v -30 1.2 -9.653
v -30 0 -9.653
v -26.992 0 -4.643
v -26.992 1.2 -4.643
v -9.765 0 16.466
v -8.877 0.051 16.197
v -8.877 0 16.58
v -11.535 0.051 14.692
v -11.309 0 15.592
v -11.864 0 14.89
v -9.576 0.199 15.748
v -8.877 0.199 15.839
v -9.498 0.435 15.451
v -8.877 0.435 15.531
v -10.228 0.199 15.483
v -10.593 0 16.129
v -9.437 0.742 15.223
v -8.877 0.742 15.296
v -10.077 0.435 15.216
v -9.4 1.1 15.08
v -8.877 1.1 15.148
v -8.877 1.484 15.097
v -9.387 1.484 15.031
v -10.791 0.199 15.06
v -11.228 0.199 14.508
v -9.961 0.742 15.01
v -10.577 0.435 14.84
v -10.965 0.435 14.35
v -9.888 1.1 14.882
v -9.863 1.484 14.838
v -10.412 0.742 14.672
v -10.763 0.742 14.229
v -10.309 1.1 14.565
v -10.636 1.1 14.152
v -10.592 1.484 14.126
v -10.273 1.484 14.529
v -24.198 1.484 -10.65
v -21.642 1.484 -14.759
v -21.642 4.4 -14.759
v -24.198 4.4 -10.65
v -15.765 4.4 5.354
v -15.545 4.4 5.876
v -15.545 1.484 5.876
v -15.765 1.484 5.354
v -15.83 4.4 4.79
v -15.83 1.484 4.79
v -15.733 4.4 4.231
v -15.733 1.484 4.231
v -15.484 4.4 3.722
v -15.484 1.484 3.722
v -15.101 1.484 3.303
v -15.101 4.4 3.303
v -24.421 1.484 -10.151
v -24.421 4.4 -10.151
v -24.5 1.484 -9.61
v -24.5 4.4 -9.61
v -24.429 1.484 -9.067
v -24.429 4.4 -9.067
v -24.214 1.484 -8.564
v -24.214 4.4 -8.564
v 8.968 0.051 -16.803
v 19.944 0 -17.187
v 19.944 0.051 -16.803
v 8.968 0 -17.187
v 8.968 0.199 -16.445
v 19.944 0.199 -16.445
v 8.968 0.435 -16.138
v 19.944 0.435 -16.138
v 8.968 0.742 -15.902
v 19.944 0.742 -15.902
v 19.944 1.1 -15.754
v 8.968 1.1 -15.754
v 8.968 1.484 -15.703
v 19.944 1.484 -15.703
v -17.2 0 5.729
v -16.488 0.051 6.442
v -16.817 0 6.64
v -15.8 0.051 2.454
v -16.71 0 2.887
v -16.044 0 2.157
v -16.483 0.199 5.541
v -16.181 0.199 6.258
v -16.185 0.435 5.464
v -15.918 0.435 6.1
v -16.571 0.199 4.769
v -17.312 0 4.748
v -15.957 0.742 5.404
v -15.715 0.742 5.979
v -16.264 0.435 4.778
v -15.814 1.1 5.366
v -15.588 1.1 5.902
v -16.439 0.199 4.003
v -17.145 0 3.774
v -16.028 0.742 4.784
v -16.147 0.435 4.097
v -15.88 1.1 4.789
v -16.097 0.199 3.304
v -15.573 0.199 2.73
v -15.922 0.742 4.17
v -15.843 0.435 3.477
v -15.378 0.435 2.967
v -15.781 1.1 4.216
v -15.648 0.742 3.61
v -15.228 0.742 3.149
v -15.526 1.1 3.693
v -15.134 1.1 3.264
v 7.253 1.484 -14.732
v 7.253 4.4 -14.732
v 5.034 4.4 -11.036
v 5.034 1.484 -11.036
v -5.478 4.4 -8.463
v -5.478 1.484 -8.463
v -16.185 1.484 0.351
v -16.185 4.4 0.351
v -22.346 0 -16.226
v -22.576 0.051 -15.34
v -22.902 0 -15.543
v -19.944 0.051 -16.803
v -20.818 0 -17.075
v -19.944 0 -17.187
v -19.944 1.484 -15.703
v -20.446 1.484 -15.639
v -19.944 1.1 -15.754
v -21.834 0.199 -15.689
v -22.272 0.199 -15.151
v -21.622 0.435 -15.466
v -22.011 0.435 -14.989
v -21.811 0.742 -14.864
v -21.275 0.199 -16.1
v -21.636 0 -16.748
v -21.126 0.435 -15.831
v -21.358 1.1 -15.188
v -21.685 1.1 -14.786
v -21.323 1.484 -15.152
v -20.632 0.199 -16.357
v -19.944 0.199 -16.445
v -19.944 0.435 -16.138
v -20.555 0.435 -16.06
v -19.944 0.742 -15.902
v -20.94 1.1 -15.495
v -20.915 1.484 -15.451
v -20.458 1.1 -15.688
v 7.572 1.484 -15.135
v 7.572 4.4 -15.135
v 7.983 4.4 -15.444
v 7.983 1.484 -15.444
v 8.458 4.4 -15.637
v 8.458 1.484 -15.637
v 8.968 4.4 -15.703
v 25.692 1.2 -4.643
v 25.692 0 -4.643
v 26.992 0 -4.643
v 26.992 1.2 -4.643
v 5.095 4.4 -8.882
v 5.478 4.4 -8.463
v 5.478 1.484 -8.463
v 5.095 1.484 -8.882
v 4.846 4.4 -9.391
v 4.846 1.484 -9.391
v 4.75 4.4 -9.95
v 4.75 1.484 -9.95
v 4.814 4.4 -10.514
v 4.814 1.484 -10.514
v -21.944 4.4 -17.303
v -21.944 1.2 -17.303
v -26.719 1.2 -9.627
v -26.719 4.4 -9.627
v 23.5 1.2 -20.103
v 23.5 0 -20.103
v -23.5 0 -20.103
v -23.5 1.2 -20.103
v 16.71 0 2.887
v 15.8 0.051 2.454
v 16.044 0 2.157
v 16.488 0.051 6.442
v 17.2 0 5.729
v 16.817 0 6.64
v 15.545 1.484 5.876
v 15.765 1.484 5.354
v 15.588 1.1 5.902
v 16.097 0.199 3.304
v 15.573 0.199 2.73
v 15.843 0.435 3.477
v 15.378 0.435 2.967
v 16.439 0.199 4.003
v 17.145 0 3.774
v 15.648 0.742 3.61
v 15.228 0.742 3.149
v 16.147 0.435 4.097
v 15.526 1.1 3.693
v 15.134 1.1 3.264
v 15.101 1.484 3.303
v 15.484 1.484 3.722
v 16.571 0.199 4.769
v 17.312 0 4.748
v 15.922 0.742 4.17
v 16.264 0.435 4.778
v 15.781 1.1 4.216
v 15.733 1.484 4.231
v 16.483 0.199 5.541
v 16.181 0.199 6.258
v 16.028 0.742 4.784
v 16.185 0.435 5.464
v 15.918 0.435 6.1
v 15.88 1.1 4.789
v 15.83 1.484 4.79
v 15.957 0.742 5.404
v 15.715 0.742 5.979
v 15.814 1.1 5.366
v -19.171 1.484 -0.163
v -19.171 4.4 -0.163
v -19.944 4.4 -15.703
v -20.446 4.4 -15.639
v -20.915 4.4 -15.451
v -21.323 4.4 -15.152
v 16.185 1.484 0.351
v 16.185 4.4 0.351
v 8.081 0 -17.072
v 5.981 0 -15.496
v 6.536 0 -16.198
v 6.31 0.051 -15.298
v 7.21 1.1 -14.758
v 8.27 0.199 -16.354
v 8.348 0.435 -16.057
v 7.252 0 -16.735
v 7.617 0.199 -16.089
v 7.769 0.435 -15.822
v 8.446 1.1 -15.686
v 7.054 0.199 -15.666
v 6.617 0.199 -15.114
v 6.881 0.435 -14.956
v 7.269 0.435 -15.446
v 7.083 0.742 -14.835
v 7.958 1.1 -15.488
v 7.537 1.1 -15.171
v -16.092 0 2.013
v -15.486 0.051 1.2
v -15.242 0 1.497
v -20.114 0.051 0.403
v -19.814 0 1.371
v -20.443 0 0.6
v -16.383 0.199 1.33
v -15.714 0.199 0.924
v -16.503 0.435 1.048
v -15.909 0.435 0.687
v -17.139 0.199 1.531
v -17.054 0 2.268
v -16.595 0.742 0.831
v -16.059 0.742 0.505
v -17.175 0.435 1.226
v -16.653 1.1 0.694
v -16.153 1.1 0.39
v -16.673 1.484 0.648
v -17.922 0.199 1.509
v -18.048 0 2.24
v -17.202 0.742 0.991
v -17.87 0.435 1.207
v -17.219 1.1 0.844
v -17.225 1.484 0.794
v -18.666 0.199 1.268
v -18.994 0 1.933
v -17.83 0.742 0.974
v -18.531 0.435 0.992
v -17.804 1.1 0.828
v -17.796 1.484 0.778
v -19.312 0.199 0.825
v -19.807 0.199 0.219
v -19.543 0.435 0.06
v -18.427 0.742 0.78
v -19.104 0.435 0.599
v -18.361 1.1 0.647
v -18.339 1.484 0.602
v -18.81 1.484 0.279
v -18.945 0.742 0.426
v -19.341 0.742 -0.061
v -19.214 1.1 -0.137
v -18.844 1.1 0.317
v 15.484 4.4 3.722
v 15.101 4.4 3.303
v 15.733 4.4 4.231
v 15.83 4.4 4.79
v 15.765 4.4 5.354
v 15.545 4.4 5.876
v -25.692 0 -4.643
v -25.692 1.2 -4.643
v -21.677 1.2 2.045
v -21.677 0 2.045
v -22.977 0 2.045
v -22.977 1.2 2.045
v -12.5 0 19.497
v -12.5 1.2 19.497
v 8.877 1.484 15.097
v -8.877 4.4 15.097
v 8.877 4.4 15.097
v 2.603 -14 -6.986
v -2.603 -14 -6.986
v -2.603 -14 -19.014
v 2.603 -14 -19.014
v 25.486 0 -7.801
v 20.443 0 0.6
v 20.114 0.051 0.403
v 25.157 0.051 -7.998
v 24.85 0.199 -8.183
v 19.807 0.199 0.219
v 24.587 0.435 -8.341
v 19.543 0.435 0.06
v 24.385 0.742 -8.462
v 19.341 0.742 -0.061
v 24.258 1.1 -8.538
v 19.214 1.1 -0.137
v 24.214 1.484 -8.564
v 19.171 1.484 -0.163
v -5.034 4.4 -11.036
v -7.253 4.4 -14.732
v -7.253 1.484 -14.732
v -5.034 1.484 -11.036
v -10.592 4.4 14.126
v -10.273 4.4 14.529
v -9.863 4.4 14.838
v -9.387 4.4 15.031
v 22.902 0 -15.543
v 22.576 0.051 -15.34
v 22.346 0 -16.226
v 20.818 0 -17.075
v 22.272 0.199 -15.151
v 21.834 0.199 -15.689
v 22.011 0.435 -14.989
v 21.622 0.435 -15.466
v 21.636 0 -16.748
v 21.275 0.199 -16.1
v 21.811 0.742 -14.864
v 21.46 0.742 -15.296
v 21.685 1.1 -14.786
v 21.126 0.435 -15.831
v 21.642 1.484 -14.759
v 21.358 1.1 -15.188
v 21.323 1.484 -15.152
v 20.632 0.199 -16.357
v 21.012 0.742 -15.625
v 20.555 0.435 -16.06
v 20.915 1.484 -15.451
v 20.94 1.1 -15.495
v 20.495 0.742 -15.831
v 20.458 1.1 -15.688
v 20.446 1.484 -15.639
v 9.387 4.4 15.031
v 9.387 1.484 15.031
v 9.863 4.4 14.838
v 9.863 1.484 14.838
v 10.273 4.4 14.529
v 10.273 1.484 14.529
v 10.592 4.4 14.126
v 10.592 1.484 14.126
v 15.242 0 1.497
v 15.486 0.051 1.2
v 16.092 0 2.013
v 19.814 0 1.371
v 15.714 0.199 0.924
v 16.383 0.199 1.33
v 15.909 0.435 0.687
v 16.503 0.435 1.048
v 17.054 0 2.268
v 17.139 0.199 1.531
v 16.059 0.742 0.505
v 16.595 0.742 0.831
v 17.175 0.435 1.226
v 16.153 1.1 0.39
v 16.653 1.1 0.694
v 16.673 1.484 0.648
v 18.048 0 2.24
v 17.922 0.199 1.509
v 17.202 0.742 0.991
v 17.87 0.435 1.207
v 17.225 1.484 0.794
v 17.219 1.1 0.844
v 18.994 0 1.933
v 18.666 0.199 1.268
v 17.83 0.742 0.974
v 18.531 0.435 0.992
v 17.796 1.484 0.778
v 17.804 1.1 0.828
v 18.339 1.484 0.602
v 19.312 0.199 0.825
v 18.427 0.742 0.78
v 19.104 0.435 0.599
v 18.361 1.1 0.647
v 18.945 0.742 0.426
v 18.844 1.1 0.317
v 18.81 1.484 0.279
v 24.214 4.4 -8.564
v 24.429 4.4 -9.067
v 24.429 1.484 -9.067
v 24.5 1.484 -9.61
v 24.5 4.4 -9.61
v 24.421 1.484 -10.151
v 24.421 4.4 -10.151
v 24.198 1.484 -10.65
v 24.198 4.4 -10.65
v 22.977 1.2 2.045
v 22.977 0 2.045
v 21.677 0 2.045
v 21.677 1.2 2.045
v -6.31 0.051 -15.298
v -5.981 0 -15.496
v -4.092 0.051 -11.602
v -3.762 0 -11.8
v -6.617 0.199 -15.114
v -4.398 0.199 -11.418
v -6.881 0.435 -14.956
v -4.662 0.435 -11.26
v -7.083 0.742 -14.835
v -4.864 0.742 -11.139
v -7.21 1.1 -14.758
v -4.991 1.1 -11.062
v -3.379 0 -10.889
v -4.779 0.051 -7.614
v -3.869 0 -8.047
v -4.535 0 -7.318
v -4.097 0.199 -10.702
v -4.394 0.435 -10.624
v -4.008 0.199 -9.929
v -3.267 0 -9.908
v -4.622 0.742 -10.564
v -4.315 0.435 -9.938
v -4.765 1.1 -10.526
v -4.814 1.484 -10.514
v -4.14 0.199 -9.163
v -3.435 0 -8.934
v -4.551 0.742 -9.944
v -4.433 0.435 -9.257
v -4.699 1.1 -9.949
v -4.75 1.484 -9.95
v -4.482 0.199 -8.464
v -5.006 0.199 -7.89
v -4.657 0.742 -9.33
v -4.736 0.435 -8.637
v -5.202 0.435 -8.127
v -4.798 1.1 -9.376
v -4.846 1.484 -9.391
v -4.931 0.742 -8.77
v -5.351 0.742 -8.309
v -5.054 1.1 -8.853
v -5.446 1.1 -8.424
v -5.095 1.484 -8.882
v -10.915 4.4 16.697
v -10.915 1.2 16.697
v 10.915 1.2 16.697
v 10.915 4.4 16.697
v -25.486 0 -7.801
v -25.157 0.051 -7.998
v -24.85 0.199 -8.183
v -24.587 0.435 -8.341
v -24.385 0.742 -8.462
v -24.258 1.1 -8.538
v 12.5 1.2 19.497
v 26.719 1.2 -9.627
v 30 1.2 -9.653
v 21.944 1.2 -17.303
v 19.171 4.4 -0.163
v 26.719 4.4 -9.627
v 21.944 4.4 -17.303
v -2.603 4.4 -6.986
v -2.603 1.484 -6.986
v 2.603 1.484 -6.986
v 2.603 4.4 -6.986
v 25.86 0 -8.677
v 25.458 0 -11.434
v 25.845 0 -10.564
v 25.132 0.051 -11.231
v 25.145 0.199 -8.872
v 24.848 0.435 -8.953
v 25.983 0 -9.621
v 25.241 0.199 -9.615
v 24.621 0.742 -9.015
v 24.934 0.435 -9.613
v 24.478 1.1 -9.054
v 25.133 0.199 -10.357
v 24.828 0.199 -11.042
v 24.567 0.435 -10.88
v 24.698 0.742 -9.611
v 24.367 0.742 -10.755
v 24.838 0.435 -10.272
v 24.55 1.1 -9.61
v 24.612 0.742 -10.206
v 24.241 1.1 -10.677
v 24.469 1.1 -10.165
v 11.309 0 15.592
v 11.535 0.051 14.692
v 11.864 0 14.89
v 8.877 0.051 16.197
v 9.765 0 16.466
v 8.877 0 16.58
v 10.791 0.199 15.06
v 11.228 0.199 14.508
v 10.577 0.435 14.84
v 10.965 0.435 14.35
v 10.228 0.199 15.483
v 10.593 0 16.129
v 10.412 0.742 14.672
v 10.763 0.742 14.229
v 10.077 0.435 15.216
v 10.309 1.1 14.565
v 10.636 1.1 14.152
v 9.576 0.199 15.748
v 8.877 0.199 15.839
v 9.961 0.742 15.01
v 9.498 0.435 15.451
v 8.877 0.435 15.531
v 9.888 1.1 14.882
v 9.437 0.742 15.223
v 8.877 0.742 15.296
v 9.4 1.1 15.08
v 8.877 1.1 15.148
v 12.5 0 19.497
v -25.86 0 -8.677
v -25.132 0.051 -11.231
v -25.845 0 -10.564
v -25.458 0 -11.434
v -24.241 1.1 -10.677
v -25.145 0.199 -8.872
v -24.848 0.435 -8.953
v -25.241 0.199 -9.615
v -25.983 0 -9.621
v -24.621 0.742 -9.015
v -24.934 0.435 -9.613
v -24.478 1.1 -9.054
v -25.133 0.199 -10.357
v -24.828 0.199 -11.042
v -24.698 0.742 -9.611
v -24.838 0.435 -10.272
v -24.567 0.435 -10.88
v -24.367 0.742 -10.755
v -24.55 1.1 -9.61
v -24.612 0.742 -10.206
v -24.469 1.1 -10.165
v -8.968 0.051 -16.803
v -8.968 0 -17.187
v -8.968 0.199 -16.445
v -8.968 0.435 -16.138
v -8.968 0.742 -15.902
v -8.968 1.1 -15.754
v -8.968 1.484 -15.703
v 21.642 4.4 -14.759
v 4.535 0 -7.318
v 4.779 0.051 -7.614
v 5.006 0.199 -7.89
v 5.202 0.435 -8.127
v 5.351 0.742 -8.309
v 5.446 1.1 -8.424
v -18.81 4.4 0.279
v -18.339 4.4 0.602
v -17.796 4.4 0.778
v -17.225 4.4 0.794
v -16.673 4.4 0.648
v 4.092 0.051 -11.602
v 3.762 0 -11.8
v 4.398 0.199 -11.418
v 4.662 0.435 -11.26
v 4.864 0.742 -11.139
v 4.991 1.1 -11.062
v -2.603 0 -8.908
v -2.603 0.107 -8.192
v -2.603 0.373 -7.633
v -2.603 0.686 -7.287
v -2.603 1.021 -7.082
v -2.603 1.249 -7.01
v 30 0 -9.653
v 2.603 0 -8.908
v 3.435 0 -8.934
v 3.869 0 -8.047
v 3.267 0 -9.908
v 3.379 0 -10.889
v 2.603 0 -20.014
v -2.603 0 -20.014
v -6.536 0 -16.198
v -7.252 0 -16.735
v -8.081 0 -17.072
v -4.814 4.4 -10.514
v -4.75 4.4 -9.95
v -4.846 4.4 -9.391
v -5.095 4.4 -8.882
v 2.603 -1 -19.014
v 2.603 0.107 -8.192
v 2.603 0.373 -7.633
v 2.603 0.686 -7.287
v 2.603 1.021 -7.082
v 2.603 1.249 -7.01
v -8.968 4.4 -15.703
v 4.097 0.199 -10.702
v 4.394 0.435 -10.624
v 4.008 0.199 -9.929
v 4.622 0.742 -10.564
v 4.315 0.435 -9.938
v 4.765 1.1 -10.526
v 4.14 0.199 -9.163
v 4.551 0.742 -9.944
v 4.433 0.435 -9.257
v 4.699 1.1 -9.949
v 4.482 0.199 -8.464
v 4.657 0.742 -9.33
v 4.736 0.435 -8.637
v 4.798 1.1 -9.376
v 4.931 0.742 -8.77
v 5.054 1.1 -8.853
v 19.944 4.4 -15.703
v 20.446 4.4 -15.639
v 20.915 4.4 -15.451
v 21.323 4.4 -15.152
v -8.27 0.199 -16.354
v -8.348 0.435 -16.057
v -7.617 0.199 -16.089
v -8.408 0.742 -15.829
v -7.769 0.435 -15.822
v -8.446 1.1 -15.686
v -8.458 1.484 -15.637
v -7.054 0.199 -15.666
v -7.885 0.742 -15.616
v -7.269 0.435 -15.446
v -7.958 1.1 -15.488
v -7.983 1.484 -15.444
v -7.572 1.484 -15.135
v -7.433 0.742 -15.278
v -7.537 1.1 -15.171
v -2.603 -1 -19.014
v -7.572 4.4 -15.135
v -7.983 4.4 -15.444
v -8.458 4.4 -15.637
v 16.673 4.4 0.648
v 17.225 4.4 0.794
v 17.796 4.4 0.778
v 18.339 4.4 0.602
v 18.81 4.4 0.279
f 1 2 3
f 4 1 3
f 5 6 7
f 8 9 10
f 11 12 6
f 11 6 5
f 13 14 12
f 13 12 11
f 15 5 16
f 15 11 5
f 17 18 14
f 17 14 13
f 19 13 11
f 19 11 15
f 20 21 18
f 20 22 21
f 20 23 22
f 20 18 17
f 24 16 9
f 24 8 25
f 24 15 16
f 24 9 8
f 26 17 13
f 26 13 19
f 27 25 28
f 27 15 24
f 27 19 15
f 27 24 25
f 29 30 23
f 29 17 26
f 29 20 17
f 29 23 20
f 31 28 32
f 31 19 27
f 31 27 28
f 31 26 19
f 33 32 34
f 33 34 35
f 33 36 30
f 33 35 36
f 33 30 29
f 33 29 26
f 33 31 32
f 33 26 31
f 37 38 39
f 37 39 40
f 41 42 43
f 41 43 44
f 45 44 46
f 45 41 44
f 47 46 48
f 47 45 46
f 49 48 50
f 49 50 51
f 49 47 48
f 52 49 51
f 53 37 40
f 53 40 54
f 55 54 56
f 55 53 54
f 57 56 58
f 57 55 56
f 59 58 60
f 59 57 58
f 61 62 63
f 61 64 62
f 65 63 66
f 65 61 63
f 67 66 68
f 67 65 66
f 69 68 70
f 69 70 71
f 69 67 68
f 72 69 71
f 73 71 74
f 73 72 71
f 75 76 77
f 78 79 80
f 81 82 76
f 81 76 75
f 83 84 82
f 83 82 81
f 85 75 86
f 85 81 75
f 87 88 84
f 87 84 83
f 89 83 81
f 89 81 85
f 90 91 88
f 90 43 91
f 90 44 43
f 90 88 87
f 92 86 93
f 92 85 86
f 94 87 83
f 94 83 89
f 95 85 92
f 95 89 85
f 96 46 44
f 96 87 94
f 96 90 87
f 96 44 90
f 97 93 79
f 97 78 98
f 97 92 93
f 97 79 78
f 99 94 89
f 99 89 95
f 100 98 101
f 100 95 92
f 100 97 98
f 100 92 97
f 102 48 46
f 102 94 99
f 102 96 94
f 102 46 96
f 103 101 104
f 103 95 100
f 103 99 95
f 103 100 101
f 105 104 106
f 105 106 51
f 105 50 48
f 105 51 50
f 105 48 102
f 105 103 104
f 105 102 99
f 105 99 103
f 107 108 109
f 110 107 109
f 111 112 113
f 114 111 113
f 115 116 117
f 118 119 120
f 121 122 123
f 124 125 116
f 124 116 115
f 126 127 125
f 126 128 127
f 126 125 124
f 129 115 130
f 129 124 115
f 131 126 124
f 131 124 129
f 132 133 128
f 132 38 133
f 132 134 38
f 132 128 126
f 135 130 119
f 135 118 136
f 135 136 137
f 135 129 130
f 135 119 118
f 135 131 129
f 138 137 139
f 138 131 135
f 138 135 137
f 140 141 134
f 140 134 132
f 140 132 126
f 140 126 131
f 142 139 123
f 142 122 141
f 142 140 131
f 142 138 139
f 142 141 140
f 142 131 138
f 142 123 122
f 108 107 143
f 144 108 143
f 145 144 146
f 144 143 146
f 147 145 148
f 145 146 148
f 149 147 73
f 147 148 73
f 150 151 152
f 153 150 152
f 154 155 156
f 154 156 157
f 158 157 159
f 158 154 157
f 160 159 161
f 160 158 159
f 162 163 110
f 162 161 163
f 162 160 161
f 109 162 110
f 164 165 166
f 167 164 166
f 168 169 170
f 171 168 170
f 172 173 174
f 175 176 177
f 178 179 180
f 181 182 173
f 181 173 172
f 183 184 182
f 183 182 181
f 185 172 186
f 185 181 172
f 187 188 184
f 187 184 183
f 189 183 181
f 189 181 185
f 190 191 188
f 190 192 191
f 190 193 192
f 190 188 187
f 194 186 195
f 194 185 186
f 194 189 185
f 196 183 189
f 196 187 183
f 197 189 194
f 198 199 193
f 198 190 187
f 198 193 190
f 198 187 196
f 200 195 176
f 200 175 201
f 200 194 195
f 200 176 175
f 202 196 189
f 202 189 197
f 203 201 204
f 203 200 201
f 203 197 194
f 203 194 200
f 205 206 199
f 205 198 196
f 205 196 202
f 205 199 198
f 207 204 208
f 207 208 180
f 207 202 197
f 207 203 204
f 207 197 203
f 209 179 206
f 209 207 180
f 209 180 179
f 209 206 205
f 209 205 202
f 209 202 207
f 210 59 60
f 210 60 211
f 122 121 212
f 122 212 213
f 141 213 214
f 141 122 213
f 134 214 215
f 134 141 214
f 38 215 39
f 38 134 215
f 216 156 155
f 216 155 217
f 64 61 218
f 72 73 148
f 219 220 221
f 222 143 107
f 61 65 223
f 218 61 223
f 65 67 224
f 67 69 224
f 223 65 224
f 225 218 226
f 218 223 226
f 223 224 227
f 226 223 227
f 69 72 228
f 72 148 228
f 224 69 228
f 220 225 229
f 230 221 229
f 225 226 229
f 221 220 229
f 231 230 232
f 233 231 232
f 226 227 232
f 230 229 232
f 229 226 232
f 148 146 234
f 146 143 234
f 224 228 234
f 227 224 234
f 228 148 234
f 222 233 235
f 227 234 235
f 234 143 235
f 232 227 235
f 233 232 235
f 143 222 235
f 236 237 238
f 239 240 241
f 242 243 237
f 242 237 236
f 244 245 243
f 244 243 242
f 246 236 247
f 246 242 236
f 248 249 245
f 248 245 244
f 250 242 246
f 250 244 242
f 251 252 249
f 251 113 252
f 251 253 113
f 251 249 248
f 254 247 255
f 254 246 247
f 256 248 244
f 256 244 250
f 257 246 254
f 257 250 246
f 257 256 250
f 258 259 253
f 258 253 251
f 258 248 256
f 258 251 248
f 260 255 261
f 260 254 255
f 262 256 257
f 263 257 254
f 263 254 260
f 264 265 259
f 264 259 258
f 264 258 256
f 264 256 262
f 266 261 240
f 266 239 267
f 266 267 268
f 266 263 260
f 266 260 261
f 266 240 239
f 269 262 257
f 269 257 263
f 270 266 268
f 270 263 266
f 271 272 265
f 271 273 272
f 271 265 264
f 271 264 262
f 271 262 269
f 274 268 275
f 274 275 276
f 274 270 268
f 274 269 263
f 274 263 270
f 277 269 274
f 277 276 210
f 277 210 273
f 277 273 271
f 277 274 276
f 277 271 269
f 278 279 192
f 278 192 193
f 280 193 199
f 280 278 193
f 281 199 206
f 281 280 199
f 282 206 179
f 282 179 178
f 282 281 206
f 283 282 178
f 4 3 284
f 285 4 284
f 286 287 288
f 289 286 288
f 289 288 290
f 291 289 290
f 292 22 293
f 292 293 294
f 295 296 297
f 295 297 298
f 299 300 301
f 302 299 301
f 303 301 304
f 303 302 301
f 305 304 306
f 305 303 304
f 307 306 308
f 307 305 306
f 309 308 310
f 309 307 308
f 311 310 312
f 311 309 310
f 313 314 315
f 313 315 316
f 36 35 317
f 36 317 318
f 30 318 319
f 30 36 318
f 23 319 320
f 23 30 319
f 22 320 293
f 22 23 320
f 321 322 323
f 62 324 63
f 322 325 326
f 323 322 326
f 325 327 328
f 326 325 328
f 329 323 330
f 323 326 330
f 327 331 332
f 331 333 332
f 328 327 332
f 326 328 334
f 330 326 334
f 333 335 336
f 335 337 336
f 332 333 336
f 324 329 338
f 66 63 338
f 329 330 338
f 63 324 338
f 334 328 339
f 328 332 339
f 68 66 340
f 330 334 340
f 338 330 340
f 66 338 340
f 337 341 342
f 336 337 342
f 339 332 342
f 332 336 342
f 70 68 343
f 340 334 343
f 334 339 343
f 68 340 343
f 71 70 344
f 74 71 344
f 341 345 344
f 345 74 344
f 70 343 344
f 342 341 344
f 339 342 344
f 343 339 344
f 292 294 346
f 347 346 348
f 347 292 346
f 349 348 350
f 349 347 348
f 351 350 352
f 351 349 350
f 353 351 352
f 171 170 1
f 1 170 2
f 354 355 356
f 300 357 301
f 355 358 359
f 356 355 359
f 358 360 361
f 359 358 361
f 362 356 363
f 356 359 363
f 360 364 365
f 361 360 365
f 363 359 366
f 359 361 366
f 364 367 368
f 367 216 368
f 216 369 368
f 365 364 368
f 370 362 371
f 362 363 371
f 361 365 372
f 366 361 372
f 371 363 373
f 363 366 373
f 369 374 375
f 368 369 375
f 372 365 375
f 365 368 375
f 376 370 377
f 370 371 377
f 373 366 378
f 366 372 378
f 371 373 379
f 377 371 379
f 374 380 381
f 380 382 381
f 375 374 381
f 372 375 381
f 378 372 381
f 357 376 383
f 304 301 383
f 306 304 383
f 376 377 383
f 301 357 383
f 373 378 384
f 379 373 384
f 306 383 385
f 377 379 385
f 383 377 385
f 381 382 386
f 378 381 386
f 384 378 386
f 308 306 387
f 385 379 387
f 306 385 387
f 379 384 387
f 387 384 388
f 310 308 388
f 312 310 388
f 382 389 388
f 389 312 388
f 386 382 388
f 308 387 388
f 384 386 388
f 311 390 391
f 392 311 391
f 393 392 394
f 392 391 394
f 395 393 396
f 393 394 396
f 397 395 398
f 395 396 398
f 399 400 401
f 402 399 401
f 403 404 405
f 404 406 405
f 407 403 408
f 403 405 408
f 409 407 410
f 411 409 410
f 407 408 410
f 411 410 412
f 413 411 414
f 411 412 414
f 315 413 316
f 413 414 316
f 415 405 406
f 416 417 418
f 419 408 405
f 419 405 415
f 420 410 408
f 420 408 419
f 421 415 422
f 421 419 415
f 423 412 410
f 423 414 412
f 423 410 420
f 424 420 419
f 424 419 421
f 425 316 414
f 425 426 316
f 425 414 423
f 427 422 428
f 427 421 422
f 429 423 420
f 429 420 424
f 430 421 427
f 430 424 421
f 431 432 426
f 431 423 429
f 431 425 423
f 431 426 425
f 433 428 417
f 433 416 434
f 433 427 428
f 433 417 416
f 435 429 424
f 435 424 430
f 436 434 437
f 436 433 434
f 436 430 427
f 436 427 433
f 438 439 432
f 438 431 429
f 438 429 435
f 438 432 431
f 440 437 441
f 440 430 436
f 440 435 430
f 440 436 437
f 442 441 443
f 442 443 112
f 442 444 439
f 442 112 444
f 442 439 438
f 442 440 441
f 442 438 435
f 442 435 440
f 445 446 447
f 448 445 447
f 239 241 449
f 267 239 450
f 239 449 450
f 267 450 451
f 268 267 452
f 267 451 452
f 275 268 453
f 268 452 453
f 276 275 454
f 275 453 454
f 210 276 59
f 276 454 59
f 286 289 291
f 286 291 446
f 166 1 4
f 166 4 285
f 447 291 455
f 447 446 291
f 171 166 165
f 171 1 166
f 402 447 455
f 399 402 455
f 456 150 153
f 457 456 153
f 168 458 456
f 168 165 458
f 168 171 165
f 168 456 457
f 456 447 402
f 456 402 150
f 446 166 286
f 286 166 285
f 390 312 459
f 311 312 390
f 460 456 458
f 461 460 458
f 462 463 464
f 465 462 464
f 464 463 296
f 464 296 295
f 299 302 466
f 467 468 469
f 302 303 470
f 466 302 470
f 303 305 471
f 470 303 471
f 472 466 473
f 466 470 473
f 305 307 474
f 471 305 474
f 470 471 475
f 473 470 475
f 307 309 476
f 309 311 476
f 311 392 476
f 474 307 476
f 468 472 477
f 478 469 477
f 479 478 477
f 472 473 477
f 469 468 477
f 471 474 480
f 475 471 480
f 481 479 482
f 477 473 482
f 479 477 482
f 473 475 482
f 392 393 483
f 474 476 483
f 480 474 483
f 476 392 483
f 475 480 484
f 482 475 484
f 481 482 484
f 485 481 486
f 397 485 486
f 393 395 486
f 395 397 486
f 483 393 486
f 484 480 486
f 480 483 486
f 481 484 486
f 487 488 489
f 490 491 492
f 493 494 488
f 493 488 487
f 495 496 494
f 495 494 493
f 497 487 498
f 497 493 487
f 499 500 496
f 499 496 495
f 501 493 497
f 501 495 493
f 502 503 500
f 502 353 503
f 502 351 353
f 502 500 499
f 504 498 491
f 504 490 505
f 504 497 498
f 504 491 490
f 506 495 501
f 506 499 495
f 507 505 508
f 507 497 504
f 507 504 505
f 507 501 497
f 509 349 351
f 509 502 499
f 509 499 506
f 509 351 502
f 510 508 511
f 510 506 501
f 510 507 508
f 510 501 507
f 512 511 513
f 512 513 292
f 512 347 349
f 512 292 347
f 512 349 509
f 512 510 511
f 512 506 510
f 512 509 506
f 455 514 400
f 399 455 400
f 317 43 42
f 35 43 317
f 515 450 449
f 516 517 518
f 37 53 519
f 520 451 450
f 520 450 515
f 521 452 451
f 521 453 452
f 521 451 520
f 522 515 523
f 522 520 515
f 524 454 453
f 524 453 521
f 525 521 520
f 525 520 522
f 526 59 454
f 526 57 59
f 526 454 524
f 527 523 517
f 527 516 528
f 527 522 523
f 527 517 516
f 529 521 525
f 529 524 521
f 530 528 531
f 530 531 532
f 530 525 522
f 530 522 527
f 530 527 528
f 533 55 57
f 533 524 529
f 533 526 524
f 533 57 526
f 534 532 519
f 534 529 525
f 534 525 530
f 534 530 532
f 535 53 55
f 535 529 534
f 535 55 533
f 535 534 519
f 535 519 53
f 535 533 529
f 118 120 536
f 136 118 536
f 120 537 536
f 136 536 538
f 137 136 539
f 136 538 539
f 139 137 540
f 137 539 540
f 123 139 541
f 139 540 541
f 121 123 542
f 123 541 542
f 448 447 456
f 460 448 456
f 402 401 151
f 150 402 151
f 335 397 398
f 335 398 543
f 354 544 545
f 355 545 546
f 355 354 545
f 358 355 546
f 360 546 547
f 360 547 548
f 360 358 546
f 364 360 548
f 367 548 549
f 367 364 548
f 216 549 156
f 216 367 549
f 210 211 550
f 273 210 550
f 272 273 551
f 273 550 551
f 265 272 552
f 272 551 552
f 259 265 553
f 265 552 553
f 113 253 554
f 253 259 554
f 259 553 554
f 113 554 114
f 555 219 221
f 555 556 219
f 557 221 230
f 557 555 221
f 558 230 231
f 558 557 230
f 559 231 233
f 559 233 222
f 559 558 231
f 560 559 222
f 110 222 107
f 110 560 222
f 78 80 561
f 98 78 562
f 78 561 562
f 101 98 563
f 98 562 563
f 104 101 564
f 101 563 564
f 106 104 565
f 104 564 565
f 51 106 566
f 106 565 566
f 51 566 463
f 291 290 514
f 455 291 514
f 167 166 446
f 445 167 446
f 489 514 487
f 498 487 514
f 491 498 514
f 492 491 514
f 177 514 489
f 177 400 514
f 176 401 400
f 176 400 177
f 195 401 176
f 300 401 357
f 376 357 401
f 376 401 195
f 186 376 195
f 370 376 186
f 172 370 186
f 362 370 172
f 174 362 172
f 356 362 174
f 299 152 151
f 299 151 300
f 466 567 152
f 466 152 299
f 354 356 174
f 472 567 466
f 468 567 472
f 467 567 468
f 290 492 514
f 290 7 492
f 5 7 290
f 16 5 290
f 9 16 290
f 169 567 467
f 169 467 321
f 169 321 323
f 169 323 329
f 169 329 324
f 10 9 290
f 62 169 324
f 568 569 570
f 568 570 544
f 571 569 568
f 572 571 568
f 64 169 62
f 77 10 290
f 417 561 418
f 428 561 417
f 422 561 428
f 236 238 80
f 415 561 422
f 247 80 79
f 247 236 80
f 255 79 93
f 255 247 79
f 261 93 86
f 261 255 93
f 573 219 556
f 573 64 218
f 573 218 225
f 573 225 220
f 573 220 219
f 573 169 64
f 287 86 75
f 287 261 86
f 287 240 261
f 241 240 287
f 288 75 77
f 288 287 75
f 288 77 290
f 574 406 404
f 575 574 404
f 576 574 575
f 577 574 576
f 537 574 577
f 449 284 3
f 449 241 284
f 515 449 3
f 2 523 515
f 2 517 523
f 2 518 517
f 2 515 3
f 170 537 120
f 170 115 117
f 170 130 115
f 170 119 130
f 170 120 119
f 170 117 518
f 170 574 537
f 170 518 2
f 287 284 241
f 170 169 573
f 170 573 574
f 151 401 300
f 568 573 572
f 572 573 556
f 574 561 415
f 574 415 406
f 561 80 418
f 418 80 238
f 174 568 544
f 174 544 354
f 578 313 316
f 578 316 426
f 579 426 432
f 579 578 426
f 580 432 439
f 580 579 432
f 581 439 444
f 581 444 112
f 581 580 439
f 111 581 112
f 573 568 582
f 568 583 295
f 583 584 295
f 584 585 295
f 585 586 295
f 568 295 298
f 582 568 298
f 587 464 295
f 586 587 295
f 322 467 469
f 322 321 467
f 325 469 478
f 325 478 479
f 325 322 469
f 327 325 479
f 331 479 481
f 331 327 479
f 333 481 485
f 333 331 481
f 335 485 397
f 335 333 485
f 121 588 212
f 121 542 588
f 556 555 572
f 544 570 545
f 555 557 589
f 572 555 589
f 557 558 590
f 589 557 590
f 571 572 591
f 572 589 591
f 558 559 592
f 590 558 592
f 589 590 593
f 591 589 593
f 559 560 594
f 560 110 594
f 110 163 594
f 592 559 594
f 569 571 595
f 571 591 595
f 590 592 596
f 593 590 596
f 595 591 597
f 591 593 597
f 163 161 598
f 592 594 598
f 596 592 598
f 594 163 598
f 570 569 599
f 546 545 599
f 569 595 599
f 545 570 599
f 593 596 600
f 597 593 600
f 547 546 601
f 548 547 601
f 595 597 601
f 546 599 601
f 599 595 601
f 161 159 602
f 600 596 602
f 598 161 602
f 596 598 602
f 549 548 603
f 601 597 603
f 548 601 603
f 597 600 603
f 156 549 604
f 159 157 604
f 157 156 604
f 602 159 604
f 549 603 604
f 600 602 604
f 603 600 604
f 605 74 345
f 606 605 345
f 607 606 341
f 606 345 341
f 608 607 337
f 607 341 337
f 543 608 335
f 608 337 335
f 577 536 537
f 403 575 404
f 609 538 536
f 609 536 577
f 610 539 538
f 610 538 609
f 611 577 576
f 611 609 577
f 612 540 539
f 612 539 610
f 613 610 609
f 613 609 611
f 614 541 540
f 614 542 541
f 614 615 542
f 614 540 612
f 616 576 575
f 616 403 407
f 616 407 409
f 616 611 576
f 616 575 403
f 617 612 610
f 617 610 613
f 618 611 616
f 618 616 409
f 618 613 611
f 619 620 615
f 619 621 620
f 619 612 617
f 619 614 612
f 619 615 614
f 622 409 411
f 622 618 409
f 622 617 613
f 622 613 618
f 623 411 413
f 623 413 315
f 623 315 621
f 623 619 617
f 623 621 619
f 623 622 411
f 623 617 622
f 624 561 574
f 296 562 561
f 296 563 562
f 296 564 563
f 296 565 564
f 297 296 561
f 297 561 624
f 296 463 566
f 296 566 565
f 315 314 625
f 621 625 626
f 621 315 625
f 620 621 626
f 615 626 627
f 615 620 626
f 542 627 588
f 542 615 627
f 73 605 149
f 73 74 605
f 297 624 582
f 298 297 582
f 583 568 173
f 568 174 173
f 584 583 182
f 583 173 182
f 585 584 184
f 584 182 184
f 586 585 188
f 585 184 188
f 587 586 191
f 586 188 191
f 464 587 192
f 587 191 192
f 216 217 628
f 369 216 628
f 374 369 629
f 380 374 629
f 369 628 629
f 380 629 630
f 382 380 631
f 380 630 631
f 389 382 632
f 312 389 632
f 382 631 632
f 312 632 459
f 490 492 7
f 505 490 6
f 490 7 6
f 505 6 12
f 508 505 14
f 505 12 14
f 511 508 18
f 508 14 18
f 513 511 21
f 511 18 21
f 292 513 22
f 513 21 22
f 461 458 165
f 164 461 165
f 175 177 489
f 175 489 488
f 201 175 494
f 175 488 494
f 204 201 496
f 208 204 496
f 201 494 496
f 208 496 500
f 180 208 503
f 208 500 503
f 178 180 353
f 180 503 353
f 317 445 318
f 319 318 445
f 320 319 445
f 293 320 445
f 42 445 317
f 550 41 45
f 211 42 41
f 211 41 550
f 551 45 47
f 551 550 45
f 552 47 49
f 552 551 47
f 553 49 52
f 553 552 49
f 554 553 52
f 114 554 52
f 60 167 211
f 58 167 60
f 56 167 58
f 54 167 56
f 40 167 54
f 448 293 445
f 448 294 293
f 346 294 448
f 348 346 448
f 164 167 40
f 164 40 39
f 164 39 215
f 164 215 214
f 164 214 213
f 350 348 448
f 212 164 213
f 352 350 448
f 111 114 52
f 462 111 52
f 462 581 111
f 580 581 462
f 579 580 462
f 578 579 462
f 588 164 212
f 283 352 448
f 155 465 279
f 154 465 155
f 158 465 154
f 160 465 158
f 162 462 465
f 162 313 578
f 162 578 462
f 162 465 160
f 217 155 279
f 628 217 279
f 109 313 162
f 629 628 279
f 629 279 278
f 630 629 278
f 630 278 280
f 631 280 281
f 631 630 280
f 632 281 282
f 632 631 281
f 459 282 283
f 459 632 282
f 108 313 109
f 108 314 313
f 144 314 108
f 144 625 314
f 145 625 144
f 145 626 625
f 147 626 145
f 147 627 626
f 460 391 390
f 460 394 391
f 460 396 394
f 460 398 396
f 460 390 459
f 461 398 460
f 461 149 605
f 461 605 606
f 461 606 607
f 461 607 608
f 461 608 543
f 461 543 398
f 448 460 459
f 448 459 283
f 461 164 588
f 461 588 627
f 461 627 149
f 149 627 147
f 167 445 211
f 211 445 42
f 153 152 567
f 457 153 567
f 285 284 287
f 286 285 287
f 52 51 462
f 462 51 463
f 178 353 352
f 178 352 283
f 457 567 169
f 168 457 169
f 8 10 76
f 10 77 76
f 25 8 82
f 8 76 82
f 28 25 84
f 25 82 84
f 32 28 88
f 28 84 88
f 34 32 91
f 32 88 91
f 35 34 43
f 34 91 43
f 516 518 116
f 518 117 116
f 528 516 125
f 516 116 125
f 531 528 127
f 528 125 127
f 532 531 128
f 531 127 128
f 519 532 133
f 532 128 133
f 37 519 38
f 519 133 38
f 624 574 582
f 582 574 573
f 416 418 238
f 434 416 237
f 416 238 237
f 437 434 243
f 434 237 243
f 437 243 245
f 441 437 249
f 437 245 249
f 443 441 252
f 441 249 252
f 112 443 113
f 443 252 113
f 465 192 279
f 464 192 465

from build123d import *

# Parameters (mm, degrees)
BOSS_EXTRUDE1_DEPTH = 1.2
BOSS_EXTRUDE2_DEPTH = 4.2
SKETCH3_W           = 5.20563433
SKETCH3_H           = 12.0272654
BOSS_EXTRUDE3_DEPTH = 14
CHAMFER3_SIZE       = 1
SKETCH4_W           = 5.20563433
SKETCH4_H           = 8.716640791
BOSS_EXTRUDE4_DEPTH = 5.4
BOSS_EXTRUDE5_DEPTH = 5.4
BOSS_EXTRUDE8_DEPTH = 5.4
FILLET1_R           = 2
FILLET3_R           = 1.4835
SKETCH12_R          = 31.501357271
CUT_EXTRUDE1_DEPTH  = 1


with BuildPart() as part:
    # Sketch1 → Boss-Extrude1 (new body)
    with BuildSketch(Plane(origin=(0, 0, 0), x_dir=(1, 0, 0), z_dir=(0, 1, 0))):
        Polygon((12.5, -19.496991909), (22.977471756, -2.044517527), (21.677471756, -2.044517527), (25.692225392, 4.642914958), (26.992225392, 4.642914958), (30, 9.653008091), (23.5, 20.103008091), (-23.5, 20.103008091), (-30, 9.653008091), (-26.992225392, 4.642914958), (-25.692225392, 4.642914958), (-21.677471756, -2.044517527), (-22.977471756, -2.044517527), (-12.5, -19.496991909), align=None)
        Polygon((-21.05511414, 15.703008091), (21.05511414, 15.703008091), (24.843569396, 9.612337718), (10.009495006, -15.096991909), (-10.009495006, -15.096991909), (-24.843569396, 9.612337718), align=None, mode=Mode.SUBTRACT)
    extrude(amount=BOSS_EXTRUDE1_DEPTH)

    # Sketch2 → Boss-Extrude2 (add)
    with BuildSketch(Plane(origin=(0, 1.2, 0), x_dir=(1, 0, 0), z_dir=(0, 1, 0))):
        Polygon((26.71863507, 9.627126944), (21.944163543, 17.303008091), (-21.944163543, 17.303008091), (-26.71863507, 9.627126944), (-10.915133186, -16.696991909), (10.915133186, -16.696991909), align=None)
        Polygon((24.843569396, 9.612337718), (21.05511414, 15.703008091), (-21.05511414, 15.703008091), (-24.843569396, 9.612337718), (-10.009495006, -15.096991909), (10.009495006, -15.096991909), align=None, mode=Mode.SUBTRACT)
    extrude(amount=BOSS_EXTRUDE2_DEPTH)

    # Sketch3 → Boss-Extrude3 (add)
    with BuildSketch(Plane.XZ):
        with Locations((0, -13)):
            Rectangle(SKETCH3_W, SKETCH3_H)
    extrude(amount=BOSS_EXTRUDE3_DEPTH)

    # Chamfer3
    chamfer3_edges = [part.edges().sort_by_distance(p)[0] for p in [
        (0, 0, -19.0136327),
    ]]
    chamfer(chamfer3_edges, length=CHAMFER3_SIZE)

    # Sketch4 → Boss-Extrude4 (add)
    with BuildSketch(Plane(origin=(0, 0, 0), x_dir=(1, 0, 0), z_dir=(0, 1, 0))):
        with Locations((0, 11.344687696)):
            Rectangle(SKETCH4_W, SKETCH4_H)
    extrude(amount=BOSS_EXTRUDE4_DEPTH)

    # Sketch6 → Boss-Extrude5 (add)
    with BuildSketch(Plane(origin=(0, 5.4, 0), x_dir=(1, 0, 0), z_dir=(0, 1, 0))):
        Polygon((-7.835791911, 15.703008091), (-2.602817165, 6.9863673), (-2.602817165, 15.703008091), align=None)
    boss_extrude5 = extrude(amount=-BOSS_EXTRUDE5_DEPTH)

    # Mirror1: Boss-Extrude5 across plane
    add(boss_extrude5.mirror(Plane(origin=(0, 0, 0), x_dir=(0, 0, 1), z_dir=(1, 0, 0))))

    # Sketch10 → Boss-Extrude8 (add)
    with BuildSketch(Plane(origin=(0, 0, 0), x_dir=(-1, 0, 0), z_dir=(0, -1, 0))):
        Polygon((-2.602817165, 6.9863673), (-4.146953179, 9.558456717), (-17.976484501, -1.826263693), (-16.432348487, -4.398353111), align=None)
        Polygon((2.602817165, 6.9863673), (4.146953179, 9.558456717), (17.976484501, -1.826263693), (16.432348487, -4.398353111), align=None)
    extrude(amount=-BOSS_EXTRUDE8_DEPTH)

    # Fillet1
    fillet1_edges = [part.edges().sort_by_distance(p)[0] for p in [
        (-7.835791911, 2.7, -15.703008091),
        (7.835791911, 2.7, -15.703008091),
        (4.146953179, 2.7, -9.558456717),
        (17.976484501, 2.7, 1.826263693),
        (16.432348487, 2.7, 4.398353111),
        (-17.976484501, 2.7, 1.826263693),
        (-4.146953179, 2.7, -9.558456717),
        (-16.432348487, 2.7, 4.398353111),
        (10.009495006, 2.7, 15.096991909),
        (24.843569396, 2.7, -9.612337718),
        (21.05511414, 2.7, -15.703008091),
        (-21.05511414, 2.7, -15.703008091),
        (-24.843569396, 2.7, -9.612337718),
        (-10.009495006, 2.7, 15.096991909),
    ]]
    fillet(fillet1_edges, radius=FILLET1_R)

    # Fillet3
    fillet3_edges = [part.edges().sort_by_distance(p)[0] for p in [
        (-8.852151276, 0, -1.841802387),
        (-13.068628591, 0, 10.001349395),
        (13.068628591, 0, 10.001349395),
        (8.852151276, 0, -1.841802387),
        (0, 0, 15.096991909),
        (-14.45582101, 0, -15.703008091),
        (-22.920045025, 0, -12.704773052),
        (-21.692654112, 0, -4.363813116),
        (-10.831403301, 0, -4.055696431),
        (-6.143665701, 0, -12.88440929),
        (6.143665701, 0, -12.88440929),
        (14.45582101, 0, -15.703008091),
        (22.920045025, 0, -12.704773052),
        (21.692654112, 0, -4.363813116),
        (10.831403301, 0, -4.055696431),
        (-15.801291957, 0, 4.507128455),
        (15.801291957, 0, 4.507128455),
        (9.862625433, 0, 14.837515971),
        (-9.862625433, 0, 14.837515971),
        (-20.915222266, 0, -15.451248181),
        (-24.499675096, 0, -9.609625316),
        (-17.795848772, 0, 0.778311547),
        (-7.982661484, 0, -15.443532153),
        (7.982661484, 0, -15.443532153),
        (20.915222266, 0, -15.451248181),
        (24.499675096, 0, -9.609625316),
        (17.795848772, 0, 0.778311547),
        (4.778009709, 0, -9.667232062),
        (-4.778009709, 0, -9.667232062),
    ]]
    fillet(fillet3_edges, radius=FILLET3_R)

    # Sketch12 → Cut-Extrude1 (cut)
    with BuildSketch(Plane(origin=(0, 5.4, 0), x_dir=(1, 0, 0), z_dir=(0, 1, 0))):
        Circle(SKETCH12_R)
    extrude(amount=-CUT_EXTRUDE1_DEPTH, mode=Mode.SUBTRACT)


solid = part.part
